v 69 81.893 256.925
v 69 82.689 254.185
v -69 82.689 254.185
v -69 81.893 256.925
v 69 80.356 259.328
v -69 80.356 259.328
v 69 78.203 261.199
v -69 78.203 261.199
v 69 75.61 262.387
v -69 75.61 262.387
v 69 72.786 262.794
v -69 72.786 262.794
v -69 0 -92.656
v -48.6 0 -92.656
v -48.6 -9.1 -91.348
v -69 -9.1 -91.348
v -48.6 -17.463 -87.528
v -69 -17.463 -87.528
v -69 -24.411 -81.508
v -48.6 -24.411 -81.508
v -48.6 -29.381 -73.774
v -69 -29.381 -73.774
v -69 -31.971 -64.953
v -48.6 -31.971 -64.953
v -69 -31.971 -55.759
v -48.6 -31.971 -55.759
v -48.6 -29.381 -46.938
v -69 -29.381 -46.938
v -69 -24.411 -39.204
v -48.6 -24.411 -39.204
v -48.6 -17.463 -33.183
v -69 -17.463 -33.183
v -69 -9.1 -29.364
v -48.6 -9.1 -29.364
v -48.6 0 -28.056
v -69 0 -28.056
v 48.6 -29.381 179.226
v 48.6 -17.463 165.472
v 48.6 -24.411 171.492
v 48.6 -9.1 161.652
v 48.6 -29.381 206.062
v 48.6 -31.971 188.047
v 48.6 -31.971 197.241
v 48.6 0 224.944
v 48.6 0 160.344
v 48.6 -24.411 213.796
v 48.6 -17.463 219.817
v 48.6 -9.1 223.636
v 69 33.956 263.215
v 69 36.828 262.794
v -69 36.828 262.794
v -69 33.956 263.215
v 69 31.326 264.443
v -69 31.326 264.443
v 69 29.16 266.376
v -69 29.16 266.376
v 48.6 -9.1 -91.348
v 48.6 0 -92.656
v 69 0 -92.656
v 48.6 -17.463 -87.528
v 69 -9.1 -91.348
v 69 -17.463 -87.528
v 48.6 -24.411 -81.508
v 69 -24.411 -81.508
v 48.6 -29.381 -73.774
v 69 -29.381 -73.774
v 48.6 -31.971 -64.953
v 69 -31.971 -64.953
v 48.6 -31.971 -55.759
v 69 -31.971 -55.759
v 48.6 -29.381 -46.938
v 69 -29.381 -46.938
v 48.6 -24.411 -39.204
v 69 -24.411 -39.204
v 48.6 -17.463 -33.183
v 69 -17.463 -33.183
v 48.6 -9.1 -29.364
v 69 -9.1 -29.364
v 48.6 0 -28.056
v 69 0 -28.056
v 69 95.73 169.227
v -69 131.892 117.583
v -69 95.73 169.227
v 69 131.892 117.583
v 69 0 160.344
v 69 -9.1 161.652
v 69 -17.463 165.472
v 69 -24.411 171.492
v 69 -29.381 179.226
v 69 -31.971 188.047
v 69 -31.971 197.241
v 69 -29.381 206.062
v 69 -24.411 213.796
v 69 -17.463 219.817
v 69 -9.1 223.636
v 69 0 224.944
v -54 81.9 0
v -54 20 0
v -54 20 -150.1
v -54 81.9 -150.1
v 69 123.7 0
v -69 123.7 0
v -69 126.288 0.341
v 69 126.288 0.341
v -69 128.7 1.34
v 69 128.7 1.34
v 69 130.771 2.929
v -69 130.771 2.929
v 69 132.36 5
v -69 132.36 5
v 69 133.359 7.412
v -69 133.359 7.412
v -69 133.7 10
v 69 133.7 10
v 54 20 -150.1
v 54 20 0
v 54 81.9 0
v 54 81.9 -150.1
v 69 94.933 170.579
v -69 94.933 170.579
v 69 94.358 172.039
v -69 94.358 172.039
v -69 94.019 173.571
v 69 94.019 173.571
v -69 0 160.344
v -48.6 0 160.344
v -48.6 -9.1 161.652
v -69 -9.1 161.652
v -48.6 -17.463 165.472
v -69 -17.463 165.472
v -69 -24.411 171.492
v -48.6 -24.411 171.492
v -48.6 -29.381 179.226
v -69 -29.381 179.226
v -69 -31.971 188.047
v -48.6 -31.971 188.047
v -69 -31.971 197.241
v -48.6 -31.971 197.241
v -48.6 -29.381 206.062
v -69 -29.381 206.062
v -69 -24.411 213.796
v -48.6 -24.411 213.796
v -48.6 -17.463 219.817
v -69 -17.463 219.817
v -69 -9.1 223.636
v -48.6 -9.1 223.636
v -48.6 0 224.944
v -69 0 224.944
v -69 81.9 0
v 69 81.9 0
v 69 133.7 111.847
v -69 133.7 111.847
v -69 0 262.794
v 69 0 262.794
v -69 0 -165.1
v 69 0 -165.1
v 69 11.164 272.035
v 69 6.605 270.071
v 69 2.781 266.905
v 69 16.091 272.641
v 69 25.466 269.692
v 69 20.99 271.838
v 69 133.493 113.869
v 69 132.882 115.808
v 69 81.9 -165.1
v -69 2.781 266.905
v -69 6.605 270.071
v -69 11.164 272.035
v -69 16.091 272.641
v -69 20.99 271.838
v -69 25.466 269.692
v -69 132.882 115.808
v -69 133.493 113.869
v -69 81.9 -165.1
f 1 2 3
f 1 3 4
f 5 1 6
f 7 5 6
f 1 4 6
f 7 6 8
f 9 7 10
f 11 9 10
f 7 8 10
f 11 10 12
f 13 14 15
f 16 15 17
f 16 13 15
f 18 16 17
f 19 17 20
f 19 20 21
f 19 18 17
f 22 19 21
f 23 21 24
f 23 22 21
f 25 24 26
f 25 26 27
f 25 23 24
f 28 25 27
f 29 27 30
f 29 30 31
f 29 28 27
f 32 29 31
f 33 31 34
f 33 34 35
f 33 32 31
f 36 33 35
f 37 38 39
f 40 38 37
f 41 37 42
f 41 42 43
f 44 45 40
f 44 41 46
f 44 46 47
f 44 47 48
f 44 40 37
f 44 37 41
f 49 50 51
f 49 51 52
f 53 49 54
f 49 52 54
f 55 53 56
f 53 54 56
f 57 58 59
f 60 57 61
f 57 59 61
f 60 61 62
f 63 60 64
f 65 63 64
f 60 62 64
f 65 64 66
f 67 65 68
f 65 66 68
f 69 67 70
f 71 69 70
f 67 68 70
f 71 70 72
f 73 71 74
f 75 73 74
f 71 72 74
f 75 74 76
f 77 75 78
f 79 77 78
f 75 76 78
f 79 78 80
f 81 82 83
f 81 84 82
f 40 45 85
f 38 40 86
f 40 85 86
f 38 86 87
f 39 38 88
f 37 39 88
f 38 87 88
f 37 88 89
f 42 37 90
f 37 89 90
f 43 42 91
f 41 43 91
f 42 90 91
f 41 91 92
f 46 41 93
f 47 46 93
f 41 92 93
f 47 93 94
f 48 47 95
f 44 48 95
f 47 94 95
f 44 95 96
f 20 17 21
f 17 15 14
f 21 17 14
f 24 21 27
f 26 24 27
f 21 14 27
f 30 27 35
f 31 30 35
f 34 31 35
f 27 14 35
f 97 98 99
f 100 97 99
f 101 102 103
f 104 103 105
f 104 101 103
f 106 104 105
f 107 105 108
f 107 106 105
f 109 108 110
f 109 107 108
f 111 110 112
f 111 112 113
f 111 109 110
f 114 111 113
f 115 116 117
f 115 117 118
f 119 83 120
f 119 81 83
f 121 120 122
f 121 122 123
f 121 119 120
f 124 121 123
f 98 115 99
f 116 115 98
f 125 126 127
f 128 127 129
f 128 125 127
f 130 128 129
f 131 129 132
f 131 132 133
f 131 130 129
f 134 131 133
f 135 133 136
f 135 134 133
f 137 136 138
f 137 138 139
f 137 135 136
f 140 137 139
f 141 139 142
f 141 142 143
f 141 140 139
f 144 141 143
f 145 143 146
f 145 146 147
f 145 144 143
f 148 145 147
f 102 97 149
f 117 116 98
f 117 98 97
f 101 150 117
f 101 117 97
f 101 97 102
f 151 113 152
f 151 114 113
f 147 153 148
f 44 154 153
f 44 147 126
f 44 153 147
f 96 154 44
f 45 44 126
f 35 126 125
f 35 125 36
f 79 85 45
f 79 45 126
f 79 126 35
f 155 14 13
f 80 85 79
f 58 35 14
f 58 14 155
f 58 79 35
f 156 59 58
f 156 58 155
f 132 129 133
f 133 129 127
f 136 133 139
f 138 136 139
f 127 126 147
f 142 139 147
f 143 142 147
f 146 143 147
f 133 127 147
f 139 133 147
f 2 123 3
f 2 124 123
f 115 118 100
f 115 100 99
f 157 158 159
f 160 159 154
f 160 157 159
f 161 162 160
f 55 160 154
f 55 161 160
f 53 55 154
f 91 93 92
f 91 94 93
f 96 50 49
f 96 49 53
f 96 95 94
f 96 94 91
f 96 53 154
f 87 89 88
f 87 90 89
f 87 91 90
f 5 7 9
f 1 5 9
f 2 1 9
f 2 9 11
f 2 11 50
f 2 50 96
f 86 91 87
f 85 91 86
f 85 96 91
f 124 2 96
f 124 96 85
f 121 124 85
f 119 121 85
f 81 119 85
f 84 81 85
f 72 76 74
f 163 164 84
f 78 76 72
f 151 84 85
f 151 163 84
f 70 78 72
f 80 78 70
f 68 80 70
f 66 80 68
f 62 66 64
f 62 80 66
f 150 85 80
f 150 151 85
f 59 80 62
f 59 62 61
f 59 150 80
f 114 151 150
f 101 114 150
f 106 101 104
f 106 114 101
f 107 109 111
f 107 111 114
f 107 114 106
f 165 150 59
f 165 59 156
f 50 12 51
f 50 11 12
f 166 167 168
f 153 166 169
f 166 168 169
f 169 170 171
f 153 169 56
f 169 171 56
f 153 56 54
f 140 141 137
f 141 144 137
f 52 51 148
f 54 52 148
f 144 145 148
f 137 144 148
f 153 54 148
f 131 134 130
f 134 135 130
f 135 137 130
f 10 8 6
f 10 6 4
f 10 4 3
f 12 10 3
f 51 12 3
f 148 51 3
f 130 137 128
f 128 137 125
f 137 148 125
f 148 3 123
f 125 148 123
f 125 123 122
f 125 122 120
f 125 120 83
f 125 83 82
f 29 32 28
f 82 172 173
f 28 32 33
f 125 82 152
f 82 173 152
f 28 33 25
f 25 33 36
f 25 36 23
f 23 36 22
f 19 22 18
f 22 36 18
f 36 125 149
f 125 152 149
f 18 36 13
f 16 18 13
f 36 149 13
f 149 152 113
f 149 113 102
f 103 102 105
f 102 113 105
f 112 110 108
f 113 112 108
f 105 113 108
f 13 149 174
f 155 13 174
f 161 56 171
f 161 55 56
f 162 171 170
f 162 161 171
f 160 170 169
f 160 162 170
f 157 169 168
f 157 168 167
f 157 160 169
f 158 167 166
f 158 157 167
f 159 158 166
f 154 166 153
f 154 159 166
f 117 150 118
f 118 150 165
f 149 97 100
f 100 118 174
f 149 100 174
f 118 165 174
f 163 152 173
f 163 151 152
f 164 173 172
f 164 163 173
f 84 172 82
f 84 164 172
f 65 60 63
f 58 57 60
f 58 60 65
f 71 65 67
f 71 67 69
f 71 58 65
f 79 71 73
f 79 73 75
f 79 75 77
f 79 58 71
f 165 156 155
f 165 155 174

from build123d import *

# Parameters (mm, degrees)
BOSS_EXTRUDE1_DEPTH = 69
SKETCH4_W           = 15
SKETCH4_H           = 150.1
BOSS_EXTRUDE2_DEPTH = 61.9
BOSS_EXTRUDE3_DEPTH = 20.4
FILLET1_R           = 10


with BuildPart() as part:
    # Sketch2 → Boss-Extrude1 (new body, symmetric)
    with BuildSketch(Plane(origin=(0, 0, 0), x_dir=(0, 0, -1), z_dir=(1, 0, 0))):
        with BuildLine():
            Line((-262.793626597, 0), (0, 0))
            Line((0, 0), (165.1, 0))
            Line((165.1, 0), (165.1, 81.9))
            Line((165.1, 81.9), (150.1, 81.9))
            Line((150.1, 81.9), (150.1, 20))
            Line((150.1, 20), (0, 20))
            Line((0, 20), (0, 133.7))
            Line((0, 133.7), (-115, 133.7))
            Line((-115, 133.7), (-171.193830238, 94.352656466))
            Line((-171.193830238, 94.352656466), (-262.793626597, 81.479144628))
            Line((-262.793626597, 81.479144628), (-262.793626597, 31.479144628))
            ThreePointArc((-262.793626597, 31.479144628), (-272.644060375, 15.739572314), (-262.793626597, 0))
        make_face()
    extrude(amount=BOSS_EXTRUDE1_DEPTH, both=True)

    # Sketch4 → Boss-Extrude2 (add)
    with BuildSketch(Plane(origin=(0, 20, 0), x_dir=(1, 0, 0), z_dir=(0, 1, 0))):
        with Locations((61.5, 75.05)):
            Rectangle(SKETCH4_W, SKETCH4_H)
    boss_extrude2 = extrude(amount=BOSS_EXTRUDE2_DEPTH)

    # Mirror1: Boss-Extrude2 across plane
    add(boss_extrude2.mirror(Plane(origin=(0, 0, 0), x_dir=(0, 0, 1), z_dir=(1, 0, 0))))

    # Sketch5 → Boss-Extrude3 (add)
    with BuildSketch(Plane(origin=(69, 0, 0), x_dir=(0, 0, -1), z_dir=(1, 0, 0))):
        with BuildLine():
            Line((-224.944060375, 0), (-160.344060375, 0))
            ThreePointArc((-160.344060375, 0), (-192.644060375, -32.3), (-224.944060375, 0))
        make_face()
        with BuildLine():
            Line((28.055939625, 0), (92.655939625, 0))
            ThreePointArc((92.655939625, 0), (60.355939625, -32.3), (28.055939625, 0))
        make_face()
    boss_extrude3 = extrude(amount=-BOSS_EXTRUDE3_DEPTH)

    # Mirror2: Boss-Extrude3 across plane
    add(boss_extrude3.mirror(Plane(origin=(0, 0, 0), x_dir=(0, 0, 1), z_dir=(1, 0, 0))))

    # Fillet1
    fillet1_edges = [part.edges().sort_by_distance(p)[0] for p in [
        (0, 31.479144628, 262.793626597),
        (0, 81.479144628, 262.793626597),
        (0, 94.352656466, 171.193830238),
        (0, 133.7, 115),
        (0, 133.7, 0),
    ]]
    fillet(fillet1_edges, radius=FILLET1_R)


solid = part.part
